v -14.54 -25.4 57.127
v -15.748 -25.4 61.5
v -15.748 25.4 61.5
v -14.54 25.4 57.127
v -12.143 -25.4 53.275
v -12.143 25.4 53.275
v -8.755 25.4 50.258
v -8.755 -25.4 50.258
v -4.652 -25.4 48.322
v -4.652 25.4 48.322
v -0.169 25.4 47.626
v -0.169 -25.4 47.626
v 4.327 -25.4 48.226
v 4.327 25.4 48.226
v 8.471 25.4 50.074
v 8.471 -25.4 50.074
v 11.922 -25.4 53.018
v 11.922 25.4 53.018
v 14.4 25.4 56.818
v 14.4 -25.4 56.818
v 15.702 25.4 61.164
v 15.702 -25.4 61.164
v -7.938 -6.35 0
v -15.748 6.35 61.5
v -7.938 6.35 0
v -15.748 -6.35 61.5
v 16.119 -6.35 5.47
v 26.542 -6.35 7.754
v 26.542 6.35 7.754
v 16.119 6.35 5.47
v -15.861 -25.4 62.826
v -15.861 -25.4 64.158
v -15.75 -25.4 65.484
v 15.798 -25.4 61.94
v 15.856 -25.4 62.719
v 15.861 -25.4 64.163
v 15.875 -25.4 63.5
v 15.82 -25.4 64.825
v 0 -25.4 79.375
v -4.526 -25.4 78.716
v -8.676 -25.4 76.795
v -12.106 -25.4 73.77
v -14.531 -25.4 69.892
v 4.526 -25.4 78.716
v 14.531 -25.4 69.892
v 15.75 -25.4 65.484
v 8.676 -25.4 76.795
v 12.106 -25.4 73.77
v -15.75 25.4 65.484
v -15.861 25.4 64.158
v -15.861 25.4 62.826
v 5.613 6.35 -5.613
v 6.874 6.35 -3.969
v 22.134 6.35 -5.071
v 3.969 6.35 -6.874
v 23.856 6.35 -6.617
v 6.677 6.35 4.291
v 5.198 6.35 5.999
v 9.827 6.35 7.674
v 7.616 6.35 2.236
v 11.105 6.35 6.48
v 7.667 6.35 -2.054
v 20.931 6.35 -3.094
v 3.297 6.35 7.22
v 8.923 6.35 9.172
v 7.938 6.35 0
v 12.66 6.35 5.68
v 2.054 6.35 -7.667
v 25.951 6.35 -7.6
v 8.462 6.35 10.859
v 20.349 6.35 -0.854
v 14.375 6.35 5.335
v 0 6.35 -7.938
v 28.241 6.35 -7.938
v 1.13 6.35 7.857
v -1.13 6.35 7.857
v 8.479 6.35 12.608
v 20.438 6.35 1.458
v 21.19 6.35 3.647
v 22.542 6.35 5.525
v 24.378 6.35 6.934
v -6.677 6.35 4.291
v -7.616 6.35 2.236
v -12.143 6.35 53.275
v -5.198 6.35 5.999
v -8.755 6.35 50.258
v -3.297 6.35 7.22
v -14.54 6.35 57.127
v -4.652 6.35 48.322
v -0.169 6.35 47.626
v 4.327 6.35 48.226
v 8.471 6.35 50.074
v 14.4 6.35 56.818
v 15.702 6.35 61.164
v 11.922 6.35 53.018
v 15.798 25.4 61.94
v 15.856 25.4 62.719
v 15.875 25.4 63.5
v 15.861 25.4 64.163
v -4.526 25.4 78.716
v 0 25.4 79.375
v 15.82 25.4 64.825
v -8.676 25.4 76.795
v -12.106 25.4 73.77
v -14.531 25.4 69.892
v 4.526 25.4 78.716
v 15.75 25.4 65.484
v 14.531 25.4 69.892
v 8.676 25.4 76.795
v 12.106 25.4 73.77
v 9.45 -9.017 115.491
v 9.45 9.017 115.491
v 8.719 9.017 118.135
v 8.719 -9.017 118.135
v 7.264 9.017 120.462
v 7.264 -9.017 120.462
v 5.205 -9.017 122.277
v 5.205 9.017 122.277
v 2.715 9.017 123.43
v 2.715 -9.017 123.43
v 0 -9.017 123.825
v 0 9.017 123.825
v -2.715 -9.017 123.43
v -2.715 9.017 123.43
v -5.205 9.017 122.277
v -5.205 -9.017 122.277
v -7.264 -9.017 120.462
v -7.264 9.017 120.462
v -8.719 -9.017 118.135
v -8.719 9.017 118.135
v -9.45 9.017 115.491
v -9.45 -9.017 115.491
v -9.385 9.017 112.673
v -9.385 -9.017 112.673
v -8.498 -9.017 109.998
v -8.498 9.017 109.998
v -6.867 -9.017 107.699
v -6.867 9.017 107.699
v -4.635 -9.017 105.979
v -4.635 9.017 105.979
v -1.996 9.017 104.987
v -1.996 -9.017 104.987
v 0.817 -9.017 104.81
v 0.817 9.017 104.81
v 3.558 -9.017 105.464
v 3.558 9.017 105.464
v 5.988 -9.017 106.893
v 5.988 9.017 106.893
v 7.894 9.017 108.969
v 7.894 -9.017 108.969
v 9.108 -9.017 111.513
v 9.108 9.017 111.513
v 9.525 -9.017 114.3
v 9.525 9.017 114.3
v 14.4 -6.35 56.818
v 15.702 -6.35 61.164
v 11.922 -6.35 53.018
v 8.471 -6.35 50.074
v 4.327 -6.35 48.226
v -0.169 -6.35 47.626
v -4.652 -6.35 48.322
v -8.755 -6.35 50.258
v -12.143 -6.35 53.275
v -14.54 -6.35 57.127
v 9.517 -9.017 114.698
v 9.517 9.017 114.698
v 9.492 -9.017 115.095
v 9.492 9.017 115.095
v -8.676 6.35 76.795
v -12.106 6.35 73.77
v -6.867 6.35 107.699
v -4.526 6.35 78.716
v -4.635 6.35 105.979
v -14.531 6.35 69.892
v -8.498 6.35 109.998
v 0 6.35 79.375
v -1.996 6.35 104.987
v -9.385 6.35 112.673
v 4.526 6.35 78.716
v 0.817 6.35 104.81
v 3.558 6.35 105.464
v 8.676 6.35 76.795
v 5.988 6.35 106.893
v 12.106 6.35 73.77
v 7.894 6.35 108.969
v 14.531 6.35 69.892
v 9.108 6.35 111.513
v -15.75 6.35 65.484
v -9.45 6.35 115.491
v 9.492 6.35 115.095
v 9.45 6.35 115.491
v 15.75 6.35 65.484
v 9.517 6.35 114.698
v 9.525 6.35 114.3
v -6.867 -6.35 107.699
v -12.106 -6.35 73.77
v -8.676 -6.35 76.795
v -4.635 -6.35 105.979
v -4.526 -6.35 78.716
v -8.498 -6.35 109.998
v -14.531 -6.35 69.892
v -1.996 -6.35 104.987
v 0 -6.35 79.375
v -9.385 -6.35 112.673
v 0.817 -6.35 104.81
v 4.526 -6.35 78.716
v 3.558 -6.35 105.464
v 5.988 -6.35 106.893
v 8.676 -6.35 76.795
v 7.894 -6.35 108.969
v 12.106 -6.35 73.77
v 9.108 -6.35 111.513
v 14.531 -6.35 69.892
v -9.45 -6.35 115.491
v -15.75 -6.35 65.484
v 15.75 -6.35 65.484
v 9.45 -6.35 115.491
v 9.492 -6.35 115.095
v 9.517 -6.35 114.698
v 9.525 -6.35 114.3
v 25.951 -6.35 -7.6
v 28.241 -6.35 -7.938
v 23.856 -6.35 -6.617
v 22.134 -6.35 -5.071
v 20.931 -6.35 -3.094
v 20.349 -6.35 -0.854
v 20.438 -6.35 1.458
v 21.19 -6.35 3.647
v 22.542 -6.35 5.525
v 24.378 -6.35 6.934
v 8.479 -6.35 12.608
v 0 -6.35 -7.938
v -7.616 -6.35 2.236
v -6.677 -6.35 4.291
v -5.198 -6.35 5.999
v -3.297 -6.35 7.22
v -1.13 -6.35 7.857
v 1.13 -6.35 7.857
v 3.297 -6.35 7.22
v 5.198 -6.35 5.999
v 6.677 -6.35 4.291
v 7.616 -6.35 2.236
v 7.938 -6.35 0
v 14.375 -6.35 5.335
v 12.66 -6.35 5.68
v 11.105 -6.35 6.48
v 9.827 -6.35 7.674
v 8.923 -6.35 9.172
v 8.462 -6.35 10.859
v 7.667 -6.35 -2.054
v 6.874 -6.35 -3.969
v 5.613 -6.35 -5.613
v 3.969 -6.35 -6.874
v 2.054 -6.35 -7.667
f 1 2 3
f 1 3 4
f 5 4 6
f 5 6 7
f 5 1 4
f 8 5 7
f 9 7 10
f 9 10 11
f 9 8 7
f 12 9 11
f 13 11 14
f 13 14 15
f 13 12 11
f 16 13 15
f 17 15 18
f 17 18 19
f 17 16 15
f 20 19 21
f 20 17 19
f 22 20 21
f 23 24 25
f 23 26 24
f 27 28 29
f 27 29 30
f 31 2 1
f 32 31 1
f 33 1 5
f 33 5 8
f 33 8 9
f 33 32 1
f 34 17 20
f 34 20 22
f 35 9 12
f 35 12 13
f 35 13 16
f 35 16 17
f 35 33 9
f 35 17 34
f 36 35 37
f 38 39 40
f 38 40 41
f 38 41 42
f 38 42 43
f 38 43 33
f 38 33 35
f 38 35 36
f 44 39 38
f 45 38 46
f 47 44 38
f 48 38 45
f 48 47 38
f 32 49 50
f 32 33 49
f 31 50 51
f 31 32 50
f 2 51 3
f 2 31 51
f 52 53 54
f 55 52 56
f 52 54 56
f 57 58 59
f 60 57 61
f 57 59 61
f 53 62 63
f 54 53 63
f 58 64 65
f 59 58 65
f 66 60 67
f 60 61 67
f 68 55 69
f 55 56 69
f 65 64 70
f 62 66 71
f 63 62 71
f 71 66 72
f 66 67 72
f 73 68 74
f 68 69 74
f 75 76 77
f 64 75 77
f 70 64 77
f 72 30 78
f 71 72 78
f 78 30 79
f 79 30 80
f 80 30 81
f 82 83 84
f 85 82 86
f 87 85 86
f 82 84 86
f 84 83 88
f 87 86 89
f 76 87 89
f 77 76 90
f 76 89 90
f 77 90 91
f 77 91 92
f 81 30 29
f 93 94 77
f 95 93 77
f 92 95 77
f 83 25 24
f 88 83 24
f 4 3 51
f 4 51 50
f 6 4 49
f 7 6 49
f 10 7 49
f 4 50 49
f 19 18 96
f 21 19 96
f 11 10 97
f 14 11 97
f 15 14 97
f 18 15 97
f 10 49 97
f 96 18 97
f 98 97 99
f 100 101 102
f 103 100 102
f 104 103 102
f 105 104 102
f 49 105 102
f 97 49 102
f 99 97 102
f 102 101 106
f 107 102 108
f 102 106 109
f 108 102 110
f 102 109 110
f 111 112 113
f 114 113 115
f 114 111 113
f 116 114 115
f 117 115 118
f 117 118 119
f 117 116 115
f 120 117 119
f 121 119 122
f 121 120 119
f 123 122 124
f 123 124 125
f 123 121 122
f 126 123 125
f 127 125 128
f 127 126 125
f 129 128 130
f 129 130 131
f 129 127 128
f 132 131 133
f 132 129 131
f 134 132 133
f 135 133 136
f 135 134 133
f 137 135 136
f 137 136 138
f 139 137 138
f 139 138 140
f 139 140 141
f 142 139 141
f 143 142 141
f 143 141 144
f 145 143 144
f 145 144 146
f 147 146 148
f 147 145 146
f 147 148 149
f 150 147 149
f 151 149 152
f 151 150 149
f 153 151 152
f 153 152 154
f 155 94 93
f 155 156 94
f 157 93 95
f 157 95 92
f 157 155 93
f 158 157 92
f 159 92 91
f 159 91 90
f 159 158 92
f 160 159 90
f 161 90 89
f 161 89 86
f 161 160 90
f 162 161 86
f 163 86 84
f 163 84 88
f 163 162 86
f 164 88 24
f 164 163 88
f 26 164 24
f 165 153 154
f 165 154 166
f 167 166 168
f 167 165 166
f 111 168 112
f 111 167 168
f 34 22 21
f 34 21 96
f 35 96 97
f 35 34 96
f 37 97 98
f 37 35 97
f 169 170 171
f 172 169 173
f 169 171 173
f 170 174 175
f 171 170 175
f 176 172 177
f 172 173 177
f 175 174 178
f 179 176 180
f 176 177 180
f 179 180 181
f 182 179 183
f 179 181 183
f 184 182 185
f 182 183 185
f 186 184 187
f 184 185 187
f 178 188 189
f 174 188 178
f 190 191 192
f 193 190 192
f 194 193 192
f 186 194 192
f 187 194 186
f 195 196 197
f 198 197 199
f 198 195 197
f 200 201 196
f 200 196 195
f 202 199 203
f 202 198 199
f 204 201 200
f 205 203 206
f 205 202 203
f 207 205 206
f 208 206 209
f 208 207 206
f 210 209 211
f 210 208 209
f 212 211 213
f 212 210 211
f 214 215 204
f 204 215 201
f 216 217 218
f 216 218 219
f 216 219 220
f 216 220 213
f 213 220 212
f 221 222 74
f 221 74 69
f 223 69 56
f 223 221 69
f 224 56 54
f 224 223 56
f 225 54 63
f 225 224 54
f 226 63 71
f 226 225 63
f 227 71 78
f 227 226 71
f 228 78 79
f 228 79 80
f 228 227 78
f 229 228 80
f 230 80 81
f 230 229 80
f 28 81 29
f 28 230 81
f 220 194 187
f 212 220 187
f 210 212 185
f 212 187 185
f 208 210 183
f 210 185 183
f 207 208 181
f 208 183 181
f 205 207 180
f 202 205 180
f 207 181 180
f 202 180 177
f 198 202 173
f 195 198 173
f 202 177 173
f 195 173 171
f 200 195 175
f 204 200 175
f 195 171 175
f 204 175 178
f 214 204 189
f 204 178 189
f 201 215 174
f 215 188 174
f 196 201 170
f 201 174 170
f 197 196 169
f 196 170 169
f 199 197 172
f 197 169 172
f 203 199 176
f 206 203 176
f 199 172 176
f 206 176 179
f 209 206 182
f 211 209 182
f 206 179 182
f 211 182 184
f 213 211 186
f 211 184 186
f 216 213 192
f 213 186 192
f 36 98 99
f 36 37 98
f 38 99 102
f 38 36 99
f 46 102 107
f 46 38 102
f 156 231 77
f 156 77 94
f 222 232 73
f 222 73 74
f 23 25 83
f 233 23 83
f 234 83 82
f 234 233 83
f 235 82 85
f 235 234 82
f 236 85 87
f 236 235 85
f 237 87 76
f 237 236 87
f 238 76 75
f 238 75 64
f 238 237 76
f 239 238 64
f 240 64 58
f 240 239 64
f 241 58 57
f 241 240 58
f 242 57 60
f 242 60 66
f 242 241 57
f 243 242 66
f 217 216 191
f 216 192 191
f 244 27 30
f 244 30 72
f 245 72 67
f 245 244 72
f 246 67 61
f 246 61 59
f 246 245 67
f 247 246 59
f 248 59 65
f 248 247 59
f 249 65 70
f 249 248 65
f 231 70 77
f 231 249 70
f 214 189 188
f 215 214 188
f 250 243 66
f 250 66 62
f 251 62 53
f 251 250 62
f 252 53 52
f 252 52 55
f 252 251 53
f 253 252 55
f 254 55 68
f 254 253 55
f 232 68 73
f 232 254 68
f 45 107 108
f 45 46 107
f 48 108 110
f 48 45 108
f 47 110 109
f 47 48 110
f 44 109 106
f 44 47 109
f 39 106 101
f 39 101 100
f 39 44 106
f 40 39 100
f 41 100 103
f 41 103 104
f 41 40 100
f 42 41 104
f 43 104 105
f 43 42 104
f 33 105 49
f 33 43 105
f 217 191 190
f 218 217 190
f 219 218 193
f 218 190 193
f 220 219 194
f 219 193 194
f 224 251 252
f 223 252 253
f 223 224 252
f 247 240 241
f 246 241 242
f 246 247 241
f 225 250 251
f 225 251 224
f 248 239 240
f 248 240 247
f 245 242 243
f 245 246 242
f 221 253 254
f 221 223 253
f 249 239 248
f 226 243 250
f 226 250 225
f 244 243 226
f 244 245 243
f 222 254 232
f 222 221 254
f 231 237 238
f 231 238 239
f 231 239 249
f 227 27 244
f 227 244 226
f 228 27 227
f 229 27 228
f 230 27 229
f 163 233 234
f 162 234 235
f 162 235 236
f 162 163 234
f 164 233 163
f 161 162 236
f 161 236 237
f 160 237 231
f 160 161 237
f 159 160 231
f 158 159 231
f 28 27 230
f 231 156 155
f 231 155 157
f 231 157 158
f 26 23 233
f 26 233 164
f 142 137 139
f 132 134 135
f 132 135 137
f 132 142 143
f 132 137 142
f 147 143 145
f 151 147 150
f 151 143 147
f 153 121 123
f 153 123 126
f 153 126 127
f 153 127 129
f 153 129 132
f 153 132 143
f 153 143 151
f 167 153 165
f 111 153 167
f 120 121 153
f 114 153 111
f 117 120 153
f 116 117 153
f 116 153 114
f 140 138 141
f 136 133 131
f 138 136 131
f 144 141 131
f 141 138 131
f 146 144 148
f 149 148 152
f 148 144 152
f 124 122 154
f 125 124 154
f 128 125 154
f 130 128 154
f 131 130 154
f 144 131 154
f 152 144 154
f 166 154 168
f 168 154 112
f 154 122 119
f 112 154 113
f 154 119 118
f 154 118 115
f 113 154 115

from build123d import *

# Parameters (mm, degrees)
F1_DEPTH = 9.017
F2_DEPTH = 25.4
F3_DEPTH = 6.35


with BuildPart() as f1:
    # F0 (on Front) → F1 (new body, symmetric)
    with BuildSketch(Plane.XZ):
        with BuildLine():
            ThreePointArc((9.450293, 115.490625), (0, 123.825), (-9.450293, 115.490625))
            ThreePointArc((-9.450293, 115.490625), (-0.596483, 104.793695), (9.525, 114.3))
            ThreePointArc((9.525, 114.3), (9.506305, 114.896483), (9.450293, 115.490625))
        make_face()
    extrude(amount=F1_DEPTH, both=True)


with BuildPart() as f2:
    # F0 (on Front) → F2 (new body, symmetric)
    with BuildSketch(Plane.XZ):
        with BuildLine():
            ThreePointArc((-15.750488, 65.484375), (-15.874998, 63.49203), (-15.748488, 61.499811))
            ThreePointArc((-15.748488, 61.499811), (-0.169423, 47.625904), (15.70221, 61.164141))
            ThreePointArc((15.70221, 61.164141), (15.831743, 62.328879), (15.875, 63.5))
            ThreePointArc((15.875, 63.5), (15.843841, 64.494139), (15.750488, 65.484375))
            ThreePointArc((15.750488, 65.484375), (0, 79.375), (-15.750488, 65.484375))
        make_face()
    extrude(amount=F2_DEPTH, both=True)


with BuildPart() as f3:
    # F0 (on Front) → F3 (new body, symmetric)
    with BuildSketch(Plane.XZ):
        with BuildLine():
            Line((-9.450293, 115.490625), (-15.750488, 65.484375))
            ThreePointArc((-15.750488, 65.484375), (0, 79.375), (15.750488, 65.484375))
            Line((15.750488, 65.484375), (9.450293, 115.490625))
            ThreePointArc((9.450293, 115.490625), (9.506305, 114.896483), (9.525, 114.3))
            ThreePointArc((9.525, 114.3), (-0.596483, 104.793695), (-9.450293, 115.490625))
        make_face()
        with BuildLine():
            ThreePointArc((-7.9375, 0), (0, 7.9375), (7.9375, 0))
            ThreePointArc((7.9375, 0), (5.61266, -5.61266), (0, -7.9375))
            Line((0, -7.9375), (28.240531, -7.9375))
            ThreePointArc((28.240531, -7.9375), (20.349126, -0.854185), (26.542082, 7.753656))
            Line((26.542082, 7.753656), (16.118594, 5.470376))
            ThreePointArc((16.118594, 5.470376), (10.424863, 7.033201), (8.478951, 12.607644))
            Line((8.478951, 12.607644), (15.70221, 61.164141))
            ThreePointArc((15.70221, 61.164141), (-0.169423, 47.625904), (-15.748488, 61.499811))
            Line((-15.748488, 61.499811), (-7.9375, 0))
        make_face()
    extrude(amount=F3_DEPTH, both=True)


solid = Compound([f1.part, f2.part, f3.part])
